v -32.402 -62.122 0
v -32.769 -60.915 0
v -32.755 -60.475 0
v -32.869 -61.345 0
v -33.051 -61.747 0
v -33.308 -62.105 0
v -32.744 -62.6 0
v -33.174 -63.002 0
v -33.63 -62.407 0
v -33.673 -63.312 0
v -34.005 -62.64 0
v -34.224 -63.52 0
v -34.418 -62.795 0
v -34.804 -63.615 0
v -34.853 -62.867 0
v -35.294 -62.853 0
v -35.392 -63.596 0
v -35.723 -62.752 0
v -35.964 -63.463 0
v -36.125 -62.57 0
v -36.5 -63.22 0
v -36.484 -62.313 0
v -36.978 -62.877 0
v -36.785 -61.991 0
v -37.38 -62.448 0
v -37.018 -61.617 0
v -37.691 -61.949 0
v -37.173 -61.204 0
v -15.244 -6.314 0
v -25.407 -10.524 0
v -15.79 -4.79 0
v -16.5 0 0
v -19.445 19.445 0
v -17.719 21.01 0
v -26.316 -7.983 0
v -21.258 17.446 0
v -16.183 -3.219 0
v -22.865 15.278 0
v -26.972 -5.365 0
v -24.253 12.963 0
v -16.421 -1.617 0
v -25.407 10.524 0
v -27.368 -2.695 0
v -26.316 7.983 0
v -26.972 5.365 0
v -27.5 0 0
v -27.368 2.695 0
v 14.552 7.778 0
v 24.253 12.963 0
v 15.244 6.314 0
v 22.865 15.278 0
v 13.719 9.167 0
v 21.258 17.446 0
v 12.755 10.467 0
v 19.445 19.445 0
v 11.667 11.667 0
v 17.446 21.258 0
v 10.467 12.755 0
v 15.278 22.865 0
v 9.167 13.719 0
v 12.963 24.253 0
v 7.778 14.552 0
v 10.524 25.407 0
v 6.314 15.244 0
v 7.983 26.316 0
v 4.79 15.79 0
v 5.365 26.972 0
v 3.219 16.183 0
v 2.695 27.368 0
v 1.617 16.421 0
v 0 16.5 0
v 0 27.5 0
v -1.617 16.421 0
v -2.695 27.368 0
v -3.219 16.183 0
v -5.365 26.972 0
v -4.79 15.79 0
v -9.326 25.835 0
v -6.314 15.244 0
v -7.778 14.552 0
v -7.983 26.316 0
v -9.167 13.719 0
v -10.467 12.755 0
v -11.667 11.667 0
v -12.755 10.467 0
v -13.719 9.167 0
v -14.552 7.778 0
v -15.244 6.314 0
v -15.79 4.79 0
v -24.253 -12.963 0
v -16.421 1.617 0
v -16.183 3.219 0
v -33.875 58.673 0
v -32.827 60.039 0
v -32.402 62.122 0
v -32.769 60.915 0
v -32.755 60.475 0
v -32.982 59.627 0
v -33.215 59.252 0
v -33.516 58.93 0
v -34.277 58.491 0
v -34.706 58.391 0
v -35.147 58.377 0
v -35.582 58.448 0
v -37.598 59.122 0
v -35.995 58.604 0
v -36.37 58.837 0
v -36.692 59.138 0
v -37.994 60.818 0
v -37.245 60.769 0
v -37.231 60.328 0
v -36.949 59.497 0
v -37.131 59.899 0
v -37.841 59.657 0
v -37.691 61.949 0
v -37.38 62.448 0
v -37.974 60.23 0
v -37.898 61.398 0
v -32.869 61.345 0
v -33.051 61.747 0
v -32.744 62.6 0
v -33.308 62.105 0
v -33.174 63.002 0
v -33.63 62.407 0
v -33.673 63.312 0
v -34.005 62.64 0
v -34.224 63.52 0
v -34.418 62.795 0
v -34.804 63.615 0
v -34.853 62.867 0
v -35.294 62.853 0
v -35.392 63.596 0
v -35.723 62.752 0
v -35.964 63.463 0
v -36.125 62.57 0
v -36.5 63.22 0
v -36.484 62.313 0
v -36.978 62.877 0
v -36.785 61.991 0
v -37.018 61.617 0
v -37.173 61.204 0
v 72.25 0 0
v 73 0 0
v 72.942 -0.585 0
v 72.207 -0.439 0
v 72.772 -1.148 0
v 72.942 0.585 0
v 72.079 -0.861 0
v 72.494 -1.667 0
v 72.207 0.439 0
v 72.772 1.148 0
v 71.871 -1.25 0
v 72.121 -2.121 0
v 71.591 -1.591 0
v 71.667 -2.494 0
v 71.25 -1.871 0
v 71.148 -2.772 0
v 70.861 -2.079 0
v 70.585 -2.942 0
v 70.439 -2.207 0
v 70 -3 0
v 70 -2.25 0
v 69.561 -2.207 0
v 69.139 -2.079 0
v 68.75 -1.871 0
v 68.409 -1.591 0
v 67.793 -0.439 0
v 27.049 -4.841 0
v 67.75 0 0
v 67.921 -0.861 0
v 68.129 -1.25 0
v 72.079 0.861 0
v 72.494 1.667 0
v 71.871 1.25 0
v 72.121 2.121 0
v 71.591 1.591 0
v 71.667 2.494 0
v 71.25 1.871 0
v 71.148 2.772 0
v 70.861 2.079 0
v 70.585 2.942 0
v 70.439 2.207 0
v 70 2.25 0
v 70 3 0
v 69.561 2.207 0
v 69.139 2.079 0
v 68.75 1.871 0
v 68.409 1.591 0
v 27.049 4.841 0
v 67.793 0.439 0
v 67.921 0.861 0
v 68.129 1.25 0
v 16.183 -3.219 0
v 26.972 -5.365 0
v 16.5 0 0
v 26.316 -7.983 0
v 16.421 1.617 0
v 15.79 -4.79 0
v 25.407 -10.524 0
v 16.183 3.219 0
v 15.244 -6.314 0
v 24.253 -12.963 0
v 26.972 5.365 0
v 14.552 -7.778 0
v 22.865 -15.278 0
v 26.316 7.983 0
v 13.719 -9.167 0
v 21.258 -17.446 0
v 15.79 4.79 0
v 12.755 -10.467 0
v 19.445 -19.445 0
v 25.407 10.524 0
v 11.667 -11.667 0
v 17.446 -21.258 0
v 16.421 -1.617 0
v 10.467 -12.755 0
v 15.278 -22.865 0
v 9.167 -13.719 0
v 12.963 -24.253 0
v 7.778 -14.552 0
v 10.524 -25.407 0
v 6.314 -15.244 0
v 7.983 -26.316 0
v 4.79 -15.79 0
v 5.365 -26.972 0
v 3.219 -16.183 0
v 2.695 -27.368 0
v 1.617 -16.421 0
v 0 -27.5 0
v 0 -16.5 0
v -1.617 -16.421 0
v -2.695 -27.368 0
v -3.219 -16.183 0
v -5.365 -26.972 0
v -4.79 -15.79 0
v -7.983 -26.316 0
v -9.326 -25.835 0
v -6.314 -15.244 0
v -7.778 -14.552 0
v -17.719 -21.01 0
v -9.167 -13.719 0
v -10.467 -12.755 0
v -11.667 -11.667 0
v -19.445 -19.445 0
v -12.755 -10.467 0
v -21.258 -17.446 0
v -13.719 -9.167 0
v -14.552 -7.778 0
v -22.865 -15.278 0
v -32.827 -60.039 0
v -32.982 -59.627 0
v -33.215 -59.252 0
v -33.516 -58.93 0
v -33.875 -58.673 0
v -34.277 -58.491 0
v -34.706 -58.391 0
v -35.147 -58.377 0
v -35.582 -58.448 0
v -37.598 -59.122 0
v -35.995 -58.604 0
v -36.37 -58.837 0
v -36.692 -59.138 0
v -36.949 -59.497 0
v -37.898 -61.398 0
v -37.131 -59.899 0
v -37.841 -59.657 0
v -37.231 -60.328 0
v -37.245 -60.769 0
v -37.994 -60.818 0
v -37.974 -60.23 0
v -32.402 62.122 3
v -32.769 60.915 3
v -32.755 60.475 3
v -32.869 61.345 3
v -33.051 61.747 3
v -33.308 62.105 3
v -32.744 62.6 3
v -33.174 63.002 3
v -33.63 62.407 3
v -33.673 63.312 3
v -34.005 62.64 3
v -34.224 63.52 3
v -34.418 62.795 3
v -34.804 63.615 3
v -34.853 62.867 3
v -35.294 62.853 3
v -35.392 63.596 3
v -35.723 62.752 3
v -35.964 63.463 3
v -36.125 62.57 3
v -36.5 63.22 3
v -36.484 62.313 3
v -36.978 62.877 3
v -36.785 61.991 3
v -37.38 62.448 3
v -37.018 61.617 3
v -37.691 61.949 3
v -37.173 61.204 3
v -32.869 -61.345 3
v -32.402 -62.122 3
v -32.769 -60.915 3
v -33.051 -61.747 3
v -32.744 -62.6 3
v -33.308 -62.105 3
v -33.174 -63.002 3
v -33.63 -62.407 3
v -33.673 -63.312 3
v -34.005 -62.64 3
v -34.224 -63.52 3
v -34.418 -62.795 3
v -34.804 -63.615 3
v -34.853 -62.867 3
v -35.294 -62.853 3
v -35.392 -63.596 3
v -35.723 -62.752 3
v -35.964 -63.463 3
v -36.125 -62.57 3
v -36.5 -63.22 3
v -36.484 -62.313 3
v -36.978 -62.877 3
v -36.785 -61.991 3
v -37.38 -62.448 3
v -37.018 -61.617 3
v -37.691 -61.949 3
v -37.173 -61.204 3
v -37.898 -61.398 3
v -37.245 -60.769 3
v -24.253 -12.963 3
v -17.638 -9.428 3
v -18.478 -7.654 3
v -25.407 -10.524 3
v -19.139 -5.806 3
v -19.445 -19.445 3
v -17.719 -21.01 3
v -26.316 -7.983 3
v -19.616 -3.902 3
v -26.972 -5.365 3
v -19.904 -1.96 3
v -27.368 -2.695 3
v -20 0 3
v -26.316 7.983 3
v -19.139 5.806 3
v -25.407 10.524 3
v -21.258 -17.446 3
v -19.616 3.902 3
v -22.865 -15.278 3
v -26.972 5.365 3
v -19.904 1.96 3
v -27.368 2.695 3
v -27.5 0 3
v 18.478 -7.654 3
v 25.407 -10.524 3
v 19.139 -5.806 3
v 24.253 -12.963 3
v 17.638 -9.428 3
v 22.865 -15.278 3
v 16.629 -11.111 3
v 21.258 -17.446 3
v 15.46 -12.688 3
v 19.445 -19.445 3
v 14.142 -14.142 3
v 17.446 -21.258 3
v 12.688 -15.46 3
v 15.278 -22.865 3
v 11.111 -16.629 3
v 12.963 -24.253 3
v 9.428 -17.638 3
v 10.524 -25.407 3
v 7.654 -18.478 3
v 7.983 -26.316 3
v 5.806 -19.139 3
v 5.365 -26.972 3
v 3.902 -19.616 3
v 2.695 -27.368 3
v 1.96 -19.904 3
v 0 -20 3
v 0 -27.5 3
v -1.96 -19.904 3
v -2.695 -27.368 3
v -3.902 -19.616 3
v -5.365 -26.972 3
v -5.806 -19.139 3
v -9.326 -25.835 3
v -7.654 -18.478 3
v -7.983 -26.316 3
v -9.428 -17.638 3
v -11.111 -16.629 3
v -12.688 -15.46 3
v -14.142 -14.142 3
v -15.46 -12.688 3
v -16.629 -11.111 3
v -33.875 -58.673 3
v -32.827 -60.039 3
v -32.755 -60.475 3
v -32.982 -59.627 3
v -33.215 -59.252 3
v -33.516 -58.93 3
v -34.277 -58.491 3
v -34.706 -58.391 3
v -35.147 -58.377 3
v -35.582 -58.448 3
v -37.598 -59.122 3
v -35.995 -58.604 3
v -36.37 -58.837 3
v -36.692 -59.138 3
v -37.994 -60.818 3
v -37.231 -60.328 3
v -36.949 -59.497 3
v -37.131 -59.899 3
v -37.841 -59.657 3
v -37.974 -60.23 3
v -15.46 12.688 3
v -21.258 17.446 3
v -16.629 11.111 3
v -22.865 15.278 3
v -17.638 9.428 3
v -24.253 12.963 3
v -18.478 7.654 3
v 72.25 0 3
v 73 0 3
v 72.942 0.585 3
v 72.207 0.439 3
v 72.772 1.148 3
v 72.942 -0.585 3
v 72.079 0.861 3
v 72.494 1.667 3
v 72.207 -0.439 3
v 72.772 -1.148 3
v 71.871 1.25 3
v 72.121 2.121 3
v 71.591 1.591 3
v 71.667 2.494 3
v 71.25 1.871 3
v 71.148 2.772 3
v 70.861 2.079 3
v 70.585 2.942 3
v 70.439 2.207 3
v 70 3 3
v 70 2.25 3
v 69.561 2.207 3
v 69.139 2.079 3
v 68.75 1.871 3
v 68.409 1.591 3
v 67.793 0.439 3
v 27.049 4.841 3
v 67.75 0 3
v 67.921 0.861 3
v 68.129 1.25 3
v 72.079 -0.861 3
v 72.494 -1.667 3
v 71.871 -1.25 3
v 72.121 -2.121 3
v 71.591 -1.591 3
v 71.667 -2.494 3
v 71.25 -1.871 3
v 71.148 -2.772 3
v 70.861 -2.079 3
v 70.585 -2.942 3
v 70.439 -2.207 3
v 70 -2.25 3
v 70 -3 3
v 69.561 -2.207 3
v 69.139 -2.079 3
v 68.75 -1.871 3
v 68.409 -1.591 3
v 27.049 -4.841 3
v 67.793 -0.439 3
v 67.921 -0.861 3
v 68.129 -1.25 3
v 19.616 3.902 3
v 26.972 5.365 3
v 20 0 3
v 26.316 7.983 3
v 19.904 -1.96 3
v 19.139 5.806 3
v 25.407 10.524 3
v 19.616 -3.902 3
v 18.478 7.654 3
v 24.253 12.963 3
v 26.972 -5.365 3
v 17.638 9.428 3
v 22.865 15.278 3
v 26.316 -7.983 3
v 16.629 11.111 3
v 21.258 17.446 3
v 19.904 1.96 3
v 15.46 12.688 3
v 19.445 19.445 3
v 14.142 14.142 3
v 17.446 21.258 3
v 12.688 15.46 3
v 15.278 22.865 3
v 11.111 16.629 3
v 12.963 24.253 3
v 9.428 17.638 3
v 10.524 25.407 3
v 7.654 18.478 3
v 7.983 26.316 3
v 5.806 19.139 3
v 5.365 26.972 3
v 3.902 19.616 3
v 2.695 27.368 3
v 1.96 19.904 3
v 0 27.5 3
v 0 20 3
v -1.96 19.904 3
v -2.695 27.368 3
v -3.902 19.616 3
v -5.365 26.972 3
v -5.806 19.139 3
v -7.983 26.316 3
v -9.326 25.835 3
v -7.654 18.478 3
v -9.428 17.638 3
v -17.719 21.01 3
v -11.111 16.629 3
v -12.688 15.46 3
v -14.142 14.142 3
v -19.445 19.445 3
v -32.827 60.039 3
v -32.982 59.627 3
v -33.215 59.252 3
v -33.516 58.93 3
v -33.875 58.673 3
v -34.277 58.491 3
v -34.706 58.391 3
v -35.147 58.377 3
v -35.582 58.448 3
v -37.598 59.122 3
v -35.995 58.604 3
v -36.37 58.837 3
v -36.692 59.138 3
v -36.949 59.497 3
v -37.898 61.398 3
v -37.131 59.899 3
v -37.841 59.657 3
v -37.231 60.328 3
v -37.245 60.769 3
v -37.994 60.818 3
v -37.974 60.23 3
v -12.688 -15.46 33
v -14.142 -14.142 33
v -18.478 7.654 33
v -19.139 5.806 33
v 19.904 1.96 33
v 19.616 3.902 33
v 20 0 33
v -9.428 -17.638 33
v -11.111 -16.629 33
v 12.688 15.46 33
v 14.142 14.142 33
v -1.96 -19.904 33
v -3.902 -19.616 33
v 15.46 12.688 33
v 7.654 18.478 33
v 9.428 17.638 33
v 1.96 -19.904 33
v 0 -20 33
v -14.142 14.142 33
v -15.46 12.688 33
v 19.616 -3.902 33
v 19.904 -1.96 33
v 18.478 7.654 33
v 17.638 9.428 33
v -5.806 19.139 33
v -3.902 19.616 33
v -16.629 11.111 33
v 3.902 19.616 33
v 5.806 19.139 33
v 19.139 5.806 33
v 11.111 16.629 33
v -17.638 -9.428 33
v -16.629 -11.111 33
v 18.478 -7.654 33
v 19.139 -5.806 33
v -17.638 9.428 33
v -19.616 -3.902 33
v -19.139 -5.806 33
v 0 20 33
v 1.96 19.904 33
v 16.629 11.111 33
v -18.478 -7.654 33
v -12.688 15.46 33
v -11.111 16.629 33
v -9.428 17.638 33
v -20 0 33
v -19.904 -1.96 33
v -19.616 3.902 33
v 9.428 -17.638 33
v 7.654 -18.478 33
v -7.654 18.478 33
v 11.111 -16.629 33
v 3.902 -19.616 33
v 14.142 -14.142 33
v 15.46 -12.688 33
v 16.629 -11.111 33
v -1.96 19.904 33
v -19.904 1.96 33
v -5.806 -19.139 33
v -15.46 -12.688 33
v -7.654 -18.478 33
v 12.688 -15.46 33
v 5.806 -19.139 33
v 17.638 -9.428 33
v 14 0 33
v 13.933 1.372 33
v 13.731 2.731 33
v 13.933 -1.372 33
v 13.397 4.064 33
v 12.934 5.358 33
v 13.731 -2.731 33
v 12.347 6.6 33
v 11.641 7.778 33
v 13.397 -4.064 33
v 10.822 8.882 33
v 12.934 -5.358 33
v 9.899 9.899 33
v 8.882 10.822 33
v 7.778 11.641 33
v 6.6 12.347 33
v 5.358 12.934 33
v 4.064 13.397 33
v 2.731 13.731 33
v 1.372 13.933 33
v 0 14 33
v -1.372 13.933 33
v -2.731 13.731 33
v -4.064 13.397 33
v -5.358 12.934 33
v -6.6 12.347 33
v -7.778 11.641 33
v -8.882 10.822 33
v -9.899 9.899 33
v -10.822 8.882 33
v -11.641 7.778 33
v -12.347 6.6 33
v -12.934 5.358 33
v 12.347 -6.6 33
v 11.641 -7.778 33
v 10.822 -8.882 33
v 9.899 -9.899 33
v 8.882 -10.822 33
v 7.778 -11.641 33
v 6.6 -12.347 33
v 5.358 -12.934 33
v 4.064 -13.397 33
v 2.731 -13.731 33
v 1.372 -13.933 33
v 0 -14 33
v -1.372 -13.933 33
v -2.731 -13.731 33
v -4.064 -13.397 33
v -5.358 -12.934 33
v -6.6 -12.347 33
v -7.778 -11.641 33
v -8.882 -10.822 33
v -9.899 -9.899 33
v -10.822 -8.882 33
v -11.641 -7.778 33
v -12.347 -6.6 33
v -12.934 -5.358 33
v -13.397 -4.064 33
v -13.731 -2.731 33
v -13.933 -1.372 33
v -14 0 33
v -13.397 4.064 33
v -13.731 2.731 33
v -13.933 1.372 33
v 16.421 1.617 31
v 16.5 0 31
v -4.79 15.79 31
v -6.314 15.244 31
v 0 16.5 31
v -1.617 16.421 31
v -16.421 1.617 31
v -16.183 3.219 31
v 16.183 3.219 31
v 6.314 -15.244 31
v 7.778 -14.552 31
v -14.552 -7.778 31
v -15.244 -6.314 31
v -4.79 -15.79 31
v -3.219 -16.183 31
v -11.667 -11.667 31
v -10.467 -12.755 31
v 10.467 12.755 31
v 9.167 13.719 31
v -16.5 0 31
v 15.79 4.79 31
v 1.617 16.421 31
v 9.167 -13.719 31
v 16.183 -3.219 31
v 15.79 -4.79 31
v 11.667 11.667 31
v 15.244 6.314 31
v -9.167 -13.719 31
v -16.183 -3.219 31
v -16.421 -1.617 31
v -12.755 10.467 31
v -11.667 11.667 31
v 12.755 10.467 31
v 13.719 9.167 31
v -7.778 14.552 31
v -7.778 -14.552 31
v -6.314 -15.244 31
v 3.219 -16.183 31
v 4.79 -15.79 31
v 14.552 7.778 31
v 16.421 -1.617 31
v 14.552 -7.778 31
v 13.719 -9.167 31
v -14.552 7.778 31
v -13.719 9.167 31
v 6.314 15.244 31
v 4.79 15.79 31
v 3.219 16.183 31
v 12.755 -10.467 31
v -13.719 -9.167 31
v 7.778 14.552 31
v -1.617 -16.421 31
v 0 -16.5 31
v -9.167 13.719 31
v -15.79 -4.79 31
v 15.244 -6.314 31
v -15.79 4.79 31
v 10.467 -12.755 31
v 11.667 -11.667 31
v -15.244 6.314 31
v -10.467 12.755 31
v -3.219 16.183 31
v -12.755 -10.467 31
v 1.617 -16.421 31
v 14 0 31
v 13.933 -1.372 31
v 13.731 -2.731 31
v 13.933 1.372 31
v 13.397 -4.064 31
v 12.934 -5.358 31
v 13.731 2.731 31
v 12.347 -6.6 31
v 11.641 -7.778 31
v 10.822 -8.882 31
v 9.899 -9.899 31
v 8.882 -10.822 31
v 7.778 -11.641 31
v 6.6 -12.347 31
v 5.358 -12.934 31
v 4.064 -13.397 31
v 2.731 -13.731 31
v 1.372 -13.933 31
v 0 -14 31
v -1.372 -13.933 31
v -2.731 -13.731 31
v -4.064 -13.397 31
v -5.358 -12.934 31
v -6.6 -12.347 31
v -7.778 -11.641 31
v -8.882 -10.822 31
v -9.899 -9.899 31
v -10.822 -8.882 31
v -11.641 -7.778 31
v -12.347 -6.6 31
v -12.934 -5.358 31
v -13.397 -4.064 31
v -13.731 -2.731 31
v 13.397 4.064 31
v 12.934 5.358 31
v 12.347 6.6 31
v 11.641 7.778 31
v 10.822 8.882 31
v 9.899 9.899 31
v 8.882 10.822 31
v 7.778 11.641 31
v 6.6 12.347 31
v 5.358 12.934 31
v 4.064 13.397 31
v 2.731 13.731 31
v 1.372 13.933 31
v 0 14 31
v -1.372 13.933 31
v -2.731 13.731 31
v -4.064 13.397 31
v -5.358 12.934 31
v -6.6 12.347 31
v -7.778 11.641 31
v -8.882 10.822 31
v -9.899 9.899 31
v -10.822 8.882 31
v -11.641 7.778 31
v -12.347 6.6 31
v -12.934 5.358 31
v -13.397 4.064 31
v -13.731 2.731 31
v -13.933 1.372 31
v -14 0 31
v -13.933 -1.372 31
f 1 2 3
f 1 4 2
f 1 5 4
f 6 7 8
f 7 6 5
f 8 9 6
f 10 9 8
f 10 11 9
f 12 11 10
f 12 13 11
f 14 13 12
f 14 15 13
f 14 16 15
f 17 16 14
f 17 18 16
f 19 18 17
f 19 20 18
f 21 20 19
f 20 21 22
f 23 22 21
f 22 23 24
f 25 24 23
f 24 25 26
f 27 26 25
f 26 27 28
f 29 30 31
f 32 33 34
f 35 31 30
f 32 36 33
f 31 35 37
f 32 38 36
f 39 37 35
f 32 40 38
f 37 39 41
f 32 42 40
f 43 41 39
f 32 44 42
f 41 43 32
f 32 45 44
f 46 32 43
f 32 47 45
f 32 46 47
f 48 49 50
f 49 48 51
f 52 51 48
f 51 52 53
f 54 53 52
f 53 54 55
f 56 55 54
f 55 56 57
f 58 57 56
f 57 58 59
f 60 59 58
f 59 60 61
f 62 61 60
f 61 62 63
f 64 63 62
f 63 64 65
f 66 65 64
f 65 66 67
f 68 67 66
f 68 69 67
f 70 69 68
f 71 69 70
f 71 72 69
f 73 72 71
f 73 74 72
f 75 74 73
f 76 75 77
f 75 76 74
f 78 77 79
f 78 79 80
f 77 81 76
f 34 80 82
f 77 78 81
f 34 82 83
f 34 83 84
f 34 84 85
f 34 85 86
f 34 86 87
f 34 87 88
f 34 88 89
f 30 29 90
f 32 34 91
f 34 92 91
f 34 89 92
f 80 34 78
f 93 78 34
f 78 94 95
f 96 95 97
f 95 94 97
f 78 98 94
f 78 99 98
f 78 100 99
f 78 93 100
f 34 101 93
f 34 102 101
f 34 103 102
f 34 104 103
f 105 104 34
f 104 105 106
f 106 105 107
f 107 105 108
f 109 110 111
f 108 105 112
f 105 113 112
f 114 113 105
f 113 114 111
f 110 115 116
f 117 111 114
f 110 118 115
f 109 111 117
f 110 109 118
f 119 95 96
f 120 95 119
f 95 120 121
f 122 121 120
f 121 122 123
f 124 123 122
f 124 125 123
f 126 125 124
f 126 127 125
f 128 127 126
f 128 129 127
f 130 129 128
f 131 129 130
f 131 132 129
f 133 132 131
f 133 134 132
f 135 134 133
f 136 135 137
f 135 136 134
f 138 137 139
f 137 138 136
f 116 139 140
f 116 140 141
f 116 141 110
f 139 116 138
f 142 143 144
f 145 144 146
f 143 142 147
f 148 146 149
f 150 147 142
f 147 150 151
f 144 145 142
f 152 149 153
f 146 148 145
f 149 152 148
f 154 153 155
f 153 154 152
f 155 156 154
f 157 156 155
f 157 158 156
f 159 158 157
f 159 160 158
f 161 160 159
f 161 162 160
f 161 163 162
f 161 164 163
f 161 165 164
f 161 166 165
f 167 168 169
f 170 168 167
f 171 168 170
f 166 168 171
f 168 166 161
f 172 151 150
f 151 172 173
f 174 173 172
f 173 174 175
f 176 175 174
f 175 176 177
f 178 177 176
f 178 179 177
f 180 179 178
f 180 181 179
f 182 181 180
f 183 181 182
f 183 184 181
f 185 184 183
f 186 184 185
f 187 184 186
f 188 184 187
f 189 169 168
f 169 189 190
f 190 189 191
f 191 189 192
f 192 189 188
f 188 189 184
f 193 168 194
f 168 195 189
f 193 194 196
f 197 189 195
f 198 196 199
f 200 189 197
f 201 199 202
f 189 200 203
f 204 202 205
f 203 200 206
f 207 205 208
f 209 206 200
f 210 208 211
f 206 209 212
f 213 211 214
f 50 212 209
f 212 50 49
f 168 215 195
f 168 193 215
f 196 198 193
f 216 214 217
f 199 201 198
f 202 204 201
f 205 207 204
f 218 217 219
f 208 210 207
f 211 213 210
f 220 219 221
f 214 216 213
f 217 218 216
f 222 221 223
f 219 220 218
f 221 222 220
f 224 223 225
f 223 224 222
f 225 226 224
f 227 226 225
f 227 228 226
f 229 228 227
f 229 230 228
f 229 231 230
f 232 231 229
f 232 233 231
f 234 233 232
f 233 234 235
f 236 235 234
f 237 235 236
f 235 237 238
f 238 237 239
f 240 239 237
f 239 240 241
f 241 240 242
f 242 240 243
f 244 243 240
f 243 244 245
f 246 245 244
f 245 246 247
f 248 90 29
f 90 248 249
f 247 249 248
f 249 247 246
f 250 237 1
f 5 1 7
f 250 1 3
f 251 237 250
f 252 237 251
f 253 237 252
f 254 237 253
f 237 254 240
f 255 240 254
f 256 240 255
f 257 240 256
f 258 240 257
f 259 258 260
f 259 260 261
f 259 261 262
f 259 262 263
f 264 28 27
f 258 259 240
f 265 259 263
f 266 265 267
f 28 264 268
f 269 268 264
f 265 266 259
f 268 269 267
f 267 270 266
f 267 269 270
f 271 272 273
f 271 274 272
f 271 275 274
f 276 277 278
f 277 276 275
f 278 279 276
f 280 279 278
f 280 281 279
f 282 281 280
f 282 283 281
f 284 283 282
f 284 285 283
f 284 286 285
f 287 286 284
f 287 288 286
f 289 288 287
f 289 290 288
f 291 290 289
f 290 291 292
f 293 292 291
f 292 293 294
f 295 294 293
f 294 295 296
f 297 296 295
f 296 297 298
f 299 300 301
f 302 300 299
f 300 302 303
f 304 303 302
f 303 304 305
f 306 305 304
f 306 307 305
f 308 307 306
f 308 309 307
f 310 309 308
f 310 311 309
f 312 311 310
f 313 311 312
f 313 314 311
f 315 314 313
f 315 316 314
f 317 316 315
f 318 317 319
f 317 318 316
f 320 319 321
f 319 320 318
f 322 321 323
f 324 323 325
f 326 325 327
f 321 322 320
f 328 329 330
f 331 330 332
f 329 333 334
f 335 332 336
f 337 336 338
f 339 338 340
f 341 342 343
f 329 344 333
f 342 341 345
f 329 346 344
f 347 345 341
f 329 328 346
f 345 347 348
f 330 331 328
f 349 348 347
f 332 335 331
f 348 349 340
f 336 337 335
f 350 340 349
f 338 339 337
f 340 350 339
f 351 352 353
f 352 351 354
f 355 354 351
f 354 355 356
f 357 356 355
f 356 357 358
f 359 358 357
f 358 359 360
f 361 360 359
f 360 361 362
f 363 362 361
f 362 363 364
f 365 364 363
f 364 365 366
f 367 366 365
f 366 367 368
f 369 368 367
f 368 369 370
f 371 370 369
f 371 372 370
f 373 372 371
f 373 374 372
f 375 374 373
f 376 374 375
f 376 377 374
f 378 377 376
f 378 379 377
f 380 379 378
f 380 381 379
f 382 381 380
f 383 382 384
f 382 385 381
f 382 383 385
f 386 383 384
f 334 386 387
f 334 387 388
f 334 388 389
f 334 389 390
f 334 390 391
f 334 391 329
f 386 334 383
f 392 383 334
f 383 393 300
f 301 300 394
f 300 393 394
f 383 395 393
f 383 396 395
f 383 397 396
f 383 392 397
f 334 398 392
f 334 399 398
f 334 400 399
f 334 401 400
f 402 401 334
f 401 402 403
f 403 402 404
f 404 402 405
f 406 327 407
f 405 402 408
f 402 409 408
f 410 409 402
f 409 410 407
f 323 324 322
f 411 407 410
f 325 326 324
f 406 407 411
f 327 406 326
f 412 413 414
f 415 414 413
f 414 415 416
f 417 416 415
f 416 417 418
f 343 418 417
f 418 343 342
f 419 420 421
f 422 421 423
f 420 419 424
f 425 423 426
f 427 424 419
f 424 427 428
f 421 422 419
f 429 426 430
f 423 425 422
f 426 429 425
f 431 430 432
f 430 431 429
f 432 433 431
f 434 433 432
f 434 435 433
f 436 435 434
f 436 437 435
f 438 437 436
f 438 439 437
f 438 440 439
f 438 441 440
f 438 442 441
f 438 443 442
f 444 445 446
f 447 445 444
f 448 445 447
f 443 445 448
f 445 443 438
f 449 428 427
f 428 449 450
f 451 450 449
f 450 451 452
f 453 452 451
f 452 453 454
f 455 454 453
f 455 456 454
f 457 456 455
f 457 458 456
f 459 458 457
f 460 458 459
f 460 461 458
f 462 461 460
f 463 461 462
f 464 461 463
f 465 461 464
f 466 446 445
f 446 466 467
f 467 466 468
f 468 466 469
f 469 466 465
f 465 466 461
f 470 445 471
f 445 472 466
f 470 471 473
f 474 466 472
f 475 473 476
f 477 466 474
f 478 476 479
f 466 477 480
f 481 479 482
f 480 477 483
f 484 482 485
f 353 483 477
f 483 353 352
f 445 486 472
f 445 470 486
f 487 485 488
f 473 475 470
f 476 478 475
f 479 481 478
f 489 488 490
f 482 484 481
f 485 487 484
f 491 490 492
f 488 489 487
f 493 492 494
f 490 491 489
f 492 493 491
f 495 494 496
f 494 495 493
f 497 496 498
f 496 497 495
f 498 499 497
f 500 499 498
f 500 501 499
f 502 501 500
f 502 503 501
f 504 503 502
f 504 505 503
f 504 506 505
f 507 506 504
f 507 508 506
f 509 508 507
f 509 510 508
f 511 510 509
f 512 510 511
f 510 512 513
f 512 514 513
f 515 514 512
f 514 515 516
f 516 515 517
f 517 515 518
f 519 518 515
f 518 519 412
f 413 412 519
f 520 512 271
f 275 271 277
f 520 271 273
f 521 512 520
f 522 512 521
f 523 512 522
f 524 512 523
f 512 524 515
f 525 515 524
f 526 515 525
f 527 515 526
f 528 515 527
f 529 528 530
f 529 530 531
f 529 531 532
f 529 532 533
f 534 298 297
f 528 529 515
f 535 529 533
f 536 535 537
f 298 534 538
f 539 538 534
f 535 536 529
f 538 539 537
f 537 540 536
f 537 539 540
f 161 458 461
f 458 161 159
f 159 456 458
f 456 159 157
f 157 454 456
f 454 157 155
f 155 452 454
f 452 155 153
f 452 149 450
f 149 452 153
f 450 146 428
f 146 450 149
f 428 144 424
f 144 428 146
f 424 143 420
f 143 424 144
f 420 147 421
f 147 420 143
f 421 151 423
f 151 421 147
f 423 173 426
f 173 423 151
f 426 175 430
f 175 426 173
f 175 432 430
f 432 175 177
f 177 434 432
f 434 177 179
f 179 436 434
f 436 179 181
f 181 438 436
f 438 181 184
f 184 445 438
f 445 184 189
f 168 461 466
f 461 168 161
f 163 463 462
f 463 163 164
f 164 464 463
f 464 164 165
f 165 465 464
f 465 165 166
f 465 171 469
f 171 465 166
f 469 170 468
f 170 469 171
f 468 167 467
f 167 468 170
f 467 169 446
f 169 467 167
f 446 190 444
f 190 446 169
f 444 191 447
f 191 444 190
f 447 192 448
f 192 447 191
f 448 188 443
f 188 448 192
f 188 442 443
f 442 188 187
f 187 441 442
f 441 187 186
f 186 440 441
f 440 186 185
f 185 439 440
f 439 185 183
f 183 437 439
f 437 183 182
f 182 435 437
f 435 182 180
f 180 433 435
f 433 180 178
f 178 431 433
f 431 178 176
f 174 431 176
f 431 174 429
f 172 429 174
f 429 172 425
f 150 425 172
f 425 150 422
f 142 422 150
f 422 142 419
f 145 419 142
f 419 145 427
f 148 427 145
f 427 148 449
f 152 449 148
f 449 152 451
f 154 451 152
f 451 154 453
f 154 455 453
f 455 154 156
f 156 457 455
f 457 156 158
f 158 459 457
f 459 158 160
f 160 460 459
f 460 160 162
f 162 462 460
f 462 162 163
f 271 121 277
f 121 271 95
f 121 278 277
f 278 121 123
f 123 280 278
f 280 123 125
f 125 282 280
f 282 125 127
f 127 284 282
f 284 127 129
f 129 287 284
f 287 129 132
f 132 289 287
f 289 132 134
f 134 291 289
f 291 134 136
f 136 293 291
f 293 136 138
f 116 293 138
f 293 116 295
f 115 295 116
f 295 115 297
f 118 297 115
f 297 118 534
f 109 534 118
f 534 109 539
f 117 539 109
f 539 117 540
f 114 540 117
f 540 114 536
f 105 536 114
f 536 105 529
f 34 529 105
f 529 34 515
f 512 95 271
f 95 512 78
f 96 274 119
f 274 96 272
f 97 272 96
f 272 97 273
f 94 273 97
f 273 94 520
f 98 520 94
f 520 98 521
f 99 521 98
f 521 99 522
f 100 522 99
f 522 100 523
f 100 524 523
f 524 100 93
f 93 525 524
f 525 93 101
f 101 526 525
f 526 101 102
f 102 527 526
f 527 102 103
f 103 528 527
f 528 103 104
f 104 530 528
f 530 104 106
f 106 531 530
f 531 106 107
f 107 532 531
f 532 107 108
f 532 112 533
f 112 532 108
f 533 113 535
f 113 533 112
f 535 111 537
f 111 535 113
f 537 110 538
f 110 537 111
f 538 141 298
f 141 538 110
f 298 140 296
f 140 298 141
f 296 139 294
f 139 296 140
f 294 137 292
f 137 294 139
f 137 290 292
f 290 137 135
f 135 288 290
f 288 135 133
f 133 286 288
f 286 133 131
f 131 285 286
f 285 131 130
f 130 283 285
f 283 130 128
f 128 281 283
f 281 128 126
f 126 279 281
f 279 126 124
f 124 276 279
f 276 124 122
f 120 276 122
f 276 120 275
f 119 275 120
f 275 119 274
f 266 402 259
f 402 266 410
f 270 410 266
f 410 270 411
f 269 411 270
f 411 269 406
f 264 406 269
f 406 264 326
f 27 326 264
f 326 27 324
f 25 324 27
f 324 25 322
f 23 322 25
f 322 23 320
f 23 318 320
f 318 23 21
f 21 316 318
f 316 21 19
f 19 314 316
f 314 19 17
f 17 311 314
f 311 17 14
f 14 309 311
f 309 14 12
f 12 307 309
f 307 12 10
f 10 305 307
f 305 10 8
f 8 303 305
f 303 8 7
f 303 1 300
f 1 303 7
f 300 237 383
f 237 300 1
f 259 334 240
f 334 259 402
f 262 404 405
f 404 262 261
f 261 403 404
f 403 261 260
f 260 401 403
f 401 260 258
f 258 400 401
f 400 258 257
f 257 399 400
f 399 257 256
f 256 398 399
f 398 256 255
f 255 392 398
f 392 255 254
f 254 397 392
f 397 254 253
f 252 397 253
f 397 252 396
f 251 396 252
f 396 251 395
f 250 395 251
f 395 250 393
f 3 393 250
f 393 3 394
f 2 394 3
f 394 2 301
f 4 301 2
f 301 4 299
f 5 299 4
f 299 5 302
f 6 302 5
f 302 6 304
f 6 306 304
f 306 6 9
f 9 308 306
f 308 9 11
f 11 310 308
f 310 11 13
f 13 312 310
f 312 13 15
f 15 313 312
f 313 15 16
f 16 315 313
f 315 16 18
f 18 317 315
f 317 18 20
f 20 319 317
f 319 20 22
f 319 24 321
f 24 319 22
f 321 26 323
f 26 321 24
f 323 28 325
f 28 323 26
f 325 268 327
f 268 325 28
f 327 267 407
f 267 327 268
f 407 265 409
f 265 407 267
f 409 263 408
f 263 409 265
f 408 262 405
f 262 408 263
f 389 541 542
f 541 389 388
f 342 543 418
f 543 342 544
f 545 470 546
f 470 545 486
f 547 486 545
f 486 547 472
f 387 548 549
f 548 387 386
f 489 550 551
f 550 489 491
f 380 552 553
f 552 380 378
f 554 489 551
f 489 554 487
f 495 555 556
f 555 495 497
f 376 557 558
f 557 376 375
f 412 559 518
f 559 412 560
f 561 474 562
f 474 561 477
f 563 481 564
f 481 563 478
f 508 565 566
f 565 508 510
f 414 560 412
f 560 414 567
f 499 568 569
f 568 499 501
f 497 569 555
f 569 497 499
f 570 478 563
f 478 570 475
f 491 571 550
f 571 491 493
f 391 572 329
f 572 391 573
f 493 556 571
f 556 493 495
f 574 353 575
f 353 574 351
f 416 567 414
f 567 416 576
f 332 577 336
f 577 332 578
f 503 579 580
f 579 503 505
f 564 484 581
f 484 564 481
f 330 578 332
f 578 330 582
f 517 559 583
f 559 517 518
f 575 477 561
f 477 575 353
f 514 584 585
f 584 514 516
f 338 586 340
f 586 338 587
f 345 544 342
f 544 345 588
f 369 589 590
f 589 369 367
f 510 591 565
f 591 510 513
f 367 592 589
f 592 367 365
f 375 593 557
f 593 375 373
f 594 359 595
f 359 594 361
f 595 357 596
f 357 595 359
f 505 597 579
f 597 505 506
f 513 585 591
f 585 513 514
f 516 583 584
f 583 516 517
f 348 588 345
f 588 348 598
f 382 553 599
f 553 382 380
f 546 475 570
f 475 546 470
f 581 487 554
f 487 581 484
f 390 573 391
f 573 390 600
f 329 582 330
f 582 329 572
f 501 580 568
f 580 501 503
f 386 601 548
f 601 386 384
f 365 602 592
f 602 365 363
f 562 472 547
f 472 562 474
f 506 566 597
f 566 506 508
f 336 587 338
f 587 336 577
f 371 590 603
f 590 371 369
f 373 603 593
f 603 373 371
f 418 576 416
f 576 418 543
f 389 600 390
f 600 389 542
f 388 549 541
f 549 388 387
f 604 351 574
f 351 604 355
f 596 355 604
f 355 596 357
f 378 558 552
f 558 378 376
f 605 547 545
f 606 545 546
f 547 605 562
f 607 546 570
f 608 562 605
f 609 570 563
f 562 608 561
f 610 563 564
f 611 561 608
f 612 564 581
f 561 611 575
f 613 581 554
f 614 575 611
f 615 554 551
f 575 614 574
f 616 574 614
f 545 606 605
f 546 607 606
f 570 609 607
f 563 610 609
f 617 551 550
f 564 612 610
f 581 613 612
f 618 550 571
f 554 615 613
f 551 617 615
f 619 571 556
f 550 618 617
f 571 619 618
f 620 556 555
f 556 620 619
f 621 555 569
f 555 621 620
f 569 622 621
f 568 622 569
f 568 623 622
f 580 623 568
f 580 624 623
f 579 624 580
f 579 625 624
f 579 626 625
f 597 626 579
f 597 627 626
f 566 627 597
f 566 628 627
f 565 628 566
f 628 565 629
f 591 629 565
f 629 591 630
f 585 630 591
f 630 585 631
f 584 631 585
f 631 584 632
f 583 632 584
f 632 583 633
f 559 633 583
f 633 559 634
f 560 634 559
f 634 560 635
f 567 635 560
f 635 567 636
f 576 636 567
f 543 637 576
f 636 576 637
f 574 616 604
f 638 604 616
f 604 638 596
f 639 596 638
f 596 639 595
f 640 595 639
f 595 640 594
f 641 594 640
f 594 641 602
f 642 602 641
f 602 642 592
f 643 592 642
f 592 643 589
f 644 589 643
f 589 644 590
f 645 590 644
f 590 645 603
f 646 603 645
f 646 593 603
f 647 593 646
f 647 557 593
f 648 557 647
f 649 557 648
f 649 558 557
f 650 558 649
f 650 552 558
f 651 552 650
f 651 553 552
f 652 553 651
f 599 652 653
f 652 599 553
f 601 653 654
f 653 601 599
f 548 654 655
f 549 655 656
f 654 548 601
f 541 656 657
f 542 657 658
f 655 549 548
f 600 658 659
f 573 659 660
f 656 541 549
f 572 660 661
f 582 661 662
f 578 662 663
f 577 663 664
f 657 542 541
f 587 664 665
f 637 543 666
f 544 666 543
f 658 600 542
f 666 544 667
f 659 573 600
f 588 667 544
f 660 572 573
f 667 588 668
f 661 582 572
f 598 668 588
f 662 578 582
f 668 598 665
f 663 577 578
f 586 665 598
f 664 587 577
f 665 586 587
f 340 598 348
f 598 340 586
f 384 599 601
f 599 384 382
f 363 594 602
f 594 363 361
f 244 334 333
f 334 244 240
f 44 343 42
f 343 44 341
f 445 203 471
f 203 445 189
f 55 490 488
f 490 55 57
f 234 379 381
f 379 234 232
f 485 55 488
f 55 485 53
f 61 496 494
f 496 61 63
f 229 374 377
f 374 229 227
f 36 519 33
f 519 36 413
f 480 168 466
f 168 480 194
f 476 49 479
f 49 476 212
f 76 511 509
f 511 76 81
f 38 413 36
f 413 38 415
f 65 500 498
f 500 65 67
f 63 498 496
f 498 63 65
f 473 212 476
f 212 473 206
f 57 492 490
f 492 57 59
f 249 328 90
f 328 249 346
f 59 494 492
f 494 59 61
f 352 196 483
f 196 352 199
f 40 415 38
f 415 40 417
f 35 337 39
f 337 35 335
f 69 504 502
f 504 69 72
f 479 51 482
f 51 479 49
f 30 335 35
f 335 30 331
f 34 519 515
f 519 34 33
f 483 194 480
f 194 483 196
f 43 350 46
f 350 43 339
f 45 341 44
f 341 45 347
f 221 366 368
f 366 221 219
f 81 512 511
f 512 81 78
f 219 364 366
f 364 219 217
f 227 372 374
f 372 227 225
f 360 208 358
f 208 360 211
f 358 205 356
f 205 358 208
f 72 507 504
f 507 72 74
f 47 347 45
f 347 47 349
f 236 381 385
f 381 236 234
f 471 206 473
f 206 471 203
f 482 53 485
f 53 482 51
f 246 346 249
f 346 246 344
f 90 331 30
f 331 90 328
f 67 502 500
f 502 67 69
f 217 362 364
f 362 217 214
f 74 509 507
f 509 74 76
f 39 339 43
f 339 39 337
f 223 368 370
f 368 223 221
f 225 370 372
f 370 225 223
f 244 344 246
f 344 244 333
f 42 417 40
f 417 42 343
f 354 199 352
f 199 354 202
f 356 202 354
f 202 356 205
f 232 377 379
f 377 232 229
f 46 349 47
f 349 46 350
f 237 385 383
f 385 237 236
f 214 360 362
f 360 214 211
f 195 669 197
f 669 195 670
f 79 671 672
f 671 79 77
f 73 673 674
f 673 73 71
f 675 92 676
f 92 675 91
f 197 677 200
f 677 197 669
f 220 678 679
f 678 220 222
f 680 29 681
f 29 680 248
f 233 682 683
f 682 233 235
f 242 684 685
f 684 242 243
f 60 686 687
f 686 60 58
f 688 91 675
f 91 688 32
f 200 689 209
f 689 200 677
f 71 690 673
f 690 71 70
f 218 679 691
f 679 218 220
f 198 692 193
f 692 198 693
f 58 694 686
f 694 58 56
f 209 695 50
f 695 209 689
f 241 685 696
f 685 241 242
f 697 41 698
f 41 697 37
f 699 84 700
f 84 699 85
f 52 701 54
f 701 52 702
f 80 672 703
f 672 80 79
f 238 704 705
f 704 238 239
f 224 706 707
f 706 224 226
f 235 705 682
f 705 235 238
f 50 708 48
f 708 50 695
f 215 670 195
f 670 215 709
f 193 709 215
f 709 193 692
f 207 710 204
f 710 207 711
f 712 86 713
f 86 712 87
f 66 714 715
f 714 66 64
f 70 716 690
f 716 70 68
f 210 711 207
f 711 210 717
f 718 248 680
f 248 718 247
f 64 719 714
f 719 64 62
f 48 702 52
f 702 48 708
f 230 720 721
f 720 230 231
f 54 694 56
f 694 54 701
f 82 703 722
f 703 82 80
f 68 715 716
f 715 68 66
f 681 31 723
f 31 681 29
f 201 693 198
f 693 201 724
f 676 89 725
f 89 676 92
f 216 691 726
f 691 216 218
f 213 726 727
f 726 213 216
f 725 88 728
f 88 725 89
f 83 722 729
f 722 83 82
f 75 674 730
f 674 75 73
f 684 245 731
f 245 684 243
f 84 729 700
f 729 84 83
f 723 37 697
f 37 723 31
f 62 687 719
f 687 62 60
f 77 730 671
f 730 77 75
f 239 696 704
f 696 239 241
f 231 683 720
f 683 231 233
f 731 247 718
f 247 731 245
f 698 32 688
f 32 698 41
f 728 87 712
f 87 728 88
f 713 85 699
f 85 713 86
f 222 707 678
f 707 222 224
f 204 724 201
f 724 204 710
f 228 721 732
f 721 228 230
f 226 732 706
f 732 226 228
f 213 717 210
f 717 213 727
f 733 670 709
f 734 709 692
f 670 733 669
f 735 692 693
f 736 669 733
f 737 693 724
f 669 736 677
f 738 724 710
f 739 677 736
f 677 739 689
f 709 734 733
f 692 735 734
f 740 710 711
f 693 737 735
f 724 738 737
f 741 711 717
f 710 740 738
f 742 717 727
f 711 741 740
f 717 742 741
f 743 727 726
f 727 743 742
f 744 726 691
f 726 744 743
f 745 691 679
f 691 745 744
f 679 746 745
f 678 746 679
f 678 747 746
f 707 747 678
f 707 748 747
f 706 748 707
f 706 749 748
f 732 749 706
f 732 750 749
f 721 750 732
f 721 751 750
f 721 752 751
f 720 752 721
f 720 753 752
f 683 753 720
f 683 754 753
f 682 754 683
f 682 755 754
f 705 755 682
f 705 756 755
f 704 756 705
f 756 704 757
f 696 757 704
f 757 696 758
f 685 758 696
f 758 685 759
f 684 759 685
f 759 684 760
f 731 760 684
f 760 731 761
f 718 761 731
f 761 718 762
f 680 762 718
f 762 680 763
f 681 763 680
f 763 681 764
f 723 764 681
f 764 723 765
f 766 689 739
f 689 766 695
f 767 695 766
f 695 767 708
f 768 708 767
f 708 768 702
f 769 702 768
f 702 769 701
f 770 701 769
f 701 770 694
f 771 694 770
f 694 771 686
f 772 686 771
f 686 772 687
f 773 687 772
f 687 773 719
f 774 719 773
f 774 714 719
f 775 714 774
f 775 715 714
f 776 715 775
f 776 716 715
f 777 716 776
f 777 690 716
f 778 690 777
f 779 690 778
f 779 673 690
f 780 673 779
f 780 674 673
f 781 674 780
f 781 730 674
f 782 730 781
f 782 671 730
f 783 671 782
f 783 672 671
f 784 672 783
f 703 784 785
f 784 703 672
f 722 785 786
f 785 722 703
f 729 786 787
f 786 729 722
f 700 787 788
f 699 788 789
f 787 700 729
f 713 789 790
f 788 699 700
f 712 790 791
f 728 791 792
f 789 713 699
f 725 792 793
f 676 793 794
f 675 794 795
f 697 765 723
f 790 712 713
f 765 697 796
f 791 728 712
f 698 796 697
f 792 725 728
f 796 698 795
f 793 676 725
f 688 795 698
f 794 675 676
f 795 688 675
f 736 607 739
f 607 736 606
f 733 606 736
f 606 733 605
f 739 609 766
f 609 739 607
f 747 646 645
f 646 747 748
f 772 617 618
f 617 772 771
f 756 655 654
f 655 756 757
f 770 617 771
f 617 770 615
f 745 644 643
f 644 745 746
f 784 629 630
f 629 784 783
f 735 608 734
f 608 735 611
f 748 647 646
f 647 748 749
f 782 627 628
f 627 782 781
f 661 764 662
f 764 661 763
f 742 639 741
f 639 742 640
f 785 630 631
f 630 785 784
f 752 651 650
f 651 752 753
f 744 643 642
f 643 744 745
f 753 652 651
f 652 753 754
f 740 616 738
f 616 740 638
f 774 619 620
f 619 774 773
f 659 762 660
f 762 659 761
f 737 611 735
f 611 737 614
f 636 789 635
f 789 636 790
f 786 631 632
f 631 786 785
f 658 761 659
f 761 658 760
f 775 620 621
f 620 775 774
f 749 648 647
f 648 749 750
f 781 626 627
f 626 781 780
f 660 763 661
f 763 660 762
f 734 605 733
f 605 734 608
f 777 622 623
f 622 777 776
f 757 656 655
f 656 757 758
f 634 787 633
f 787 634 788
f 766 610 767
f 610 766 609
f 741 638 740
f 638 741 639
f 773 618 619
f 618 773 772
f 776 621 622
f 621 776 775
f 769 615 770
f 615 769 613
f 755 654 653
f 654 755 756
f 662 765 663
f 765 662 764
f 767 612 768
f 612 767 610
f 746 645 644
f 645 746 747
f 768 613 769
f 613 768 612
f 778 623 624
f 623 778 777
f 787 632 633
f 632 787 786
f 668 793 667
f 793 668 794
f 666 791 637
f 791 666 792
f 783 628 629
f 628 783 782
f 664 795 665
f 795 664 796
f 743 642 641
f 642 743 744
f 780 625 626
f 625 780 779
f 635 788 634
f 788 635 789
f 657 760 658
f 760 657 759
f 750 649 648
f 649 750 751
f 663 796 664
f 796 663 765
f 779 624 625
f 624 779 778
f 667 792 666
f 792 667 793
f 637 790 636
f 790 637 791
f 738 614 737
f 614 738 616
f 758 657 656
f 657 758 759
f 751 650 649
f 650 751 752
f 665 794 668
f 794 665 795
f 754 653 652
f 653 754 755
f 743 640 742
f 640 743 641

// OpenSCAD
// file: ../bases/low_pro_with_adaptor.scad
// Low-profile lampshade base with an integrated adaptor mount: a spoked disc
// with straight foot-mounting holes around its rim and a central boss that
// the adaptor (see ../adaptor/adaptor.scad) mounts into.
//
// Placeholder: geometry not yet implemented -- currently just previews the
// mount boss and foot-hole positions so the parameter set can be wired up
// and iterated on before the spoke/rim shape is designed.
module low_pro_with_adaptor(
    num_spokes = 3,             // number of spokes joining the rim to the center mount (also the number of foot-mounting holes, one per spoke)
    foot_hole_diameter = 4.5,   // diameter of each straight foot-mounting hole, bottom to top (mm)
    foot_hole_radius = 70,      // radius from center at which the foot-mounting holes sit, one per spoke, on the spoke's centerline (mm)
    spoke_width = 6,            // width of each spoke at its tip, i.e. at the foot-mounting hole (mm)
    spoke_width_center = 12,    // width of each spoke at the center mount, tapering down to spoke_width at the tip (mm)
    spoke_height = 3,           // height of each spoke (mm)
    mount_od = 40,              // outer diameter of the central adaptor-mount boss (mm)
    mount_id = 33,               // inner diameter of the central adaptor-mount boss, i.e. the bore the adaptor sits in (mm)
    mount_height = 30,           // height of the central adaptor-mount boss (mm)
    mount_hole_diameter = 28   // diameter of the fixing hole(s) through the mount boss, e.g. for a self-tapping screw into the adaptor (mm)
) {
    union() {    
        difference() {
            union() {
                cylinder(h = mount_height + spoke_height, d = mount_od, $fn = 64);
                cylinder(h = spoke_height, d = mount_od + 15, $fn = 64);
                for (n = [0:1:num_spokes]) {
                    rotate([0,0,n*360/num_spokes]) {
                        linear_extrude(spoke_height) {
                            difference() {
                                union() {
                                    polygon(points = [
                                        [0, spoke_width_center/2],
                                        [foot_hole_radius, spoke_width/2],
                                        [foot_hole_radius, -spoke_width/2],
                                        [0, -spoke_width_center/2]
                                    ]);
                                    translate([foot_hole_radius,0,-1]) circle(d = spoke_width, $fn = 32);
                                }
                                translate([foot_hole_radius,0,-1]) circle(d = foot_hole_diameter, $fn = 32);
                            }
                        }
                    }
                }
            }
            translate([0, 0, -1]) cylinder(h = mount_height + spoke_height - 1, d = mount_id, $fn = 64);
            translate([0, 0, -1]) cylinder(h = mount_height + spoke_height + 2, d = mount_hole_diameter, $fn = 64);
        }        
    }
}

// Standalone preview with default parameters
low_pro_with_adaptor();
// main file
use <../bases/low_pro_with_adaptor.scad>;

// Copied from turbine_large.scad -- keep these in sync with that file so the
// base's spokes/foot holes/mount bore line up with the shade.
divs_per_circle = 3;      // number of blades/spokes; must match divs_per_circle in turbine_large.scad
foot_hole_diameter = 4.5; // must match foot_hole_diameter in turbine_large.scad (mm)
foot_hole_radius = 70;    // must match foot_hole_radius in turbine_large.scad (mm)
mount_od = 40;            // outer diameter of the central adaptor-mount boss; must match center_hole_diameter in turbine_large.scad (mm)

// TODO: tune these
spoke_width = 6;          // width of each spoke at its tip, i.e. at the foot-mounting hole (mm)
spoke_width_center = 12;  // width of each spoke at the center mount, tapering down to spoke_width at the tip (mm)
spoke_height = 3;         // height of each spoke (mm)
mount_id = 33;            // inner diameter of the central adaptor-mount boss, i.e. the bore the adaptor sits in (mm)
mount_height = 30;         // height of the central adaptor-mount boss (mm)
mount_hole_diameter = 28; // diameter of the fixing hole(s) through the mount boss (mm)

low_pro_with_adaptor(
    num_spokes = divs_per_circle,
    foot_hole_diameter = foot_hole_diameter,
    foot_hole_radius = foot_hole_radius,
    spoke_width = spoke_width,
    spoke_width_center = spoke_width_center,
    spoke_height = spoke_height,
    mount_od = mount_od,
    mount_id = mount_id,
    mount_height = mount_height,
    mount_hole_diameter = mount_hole_diameter
);
